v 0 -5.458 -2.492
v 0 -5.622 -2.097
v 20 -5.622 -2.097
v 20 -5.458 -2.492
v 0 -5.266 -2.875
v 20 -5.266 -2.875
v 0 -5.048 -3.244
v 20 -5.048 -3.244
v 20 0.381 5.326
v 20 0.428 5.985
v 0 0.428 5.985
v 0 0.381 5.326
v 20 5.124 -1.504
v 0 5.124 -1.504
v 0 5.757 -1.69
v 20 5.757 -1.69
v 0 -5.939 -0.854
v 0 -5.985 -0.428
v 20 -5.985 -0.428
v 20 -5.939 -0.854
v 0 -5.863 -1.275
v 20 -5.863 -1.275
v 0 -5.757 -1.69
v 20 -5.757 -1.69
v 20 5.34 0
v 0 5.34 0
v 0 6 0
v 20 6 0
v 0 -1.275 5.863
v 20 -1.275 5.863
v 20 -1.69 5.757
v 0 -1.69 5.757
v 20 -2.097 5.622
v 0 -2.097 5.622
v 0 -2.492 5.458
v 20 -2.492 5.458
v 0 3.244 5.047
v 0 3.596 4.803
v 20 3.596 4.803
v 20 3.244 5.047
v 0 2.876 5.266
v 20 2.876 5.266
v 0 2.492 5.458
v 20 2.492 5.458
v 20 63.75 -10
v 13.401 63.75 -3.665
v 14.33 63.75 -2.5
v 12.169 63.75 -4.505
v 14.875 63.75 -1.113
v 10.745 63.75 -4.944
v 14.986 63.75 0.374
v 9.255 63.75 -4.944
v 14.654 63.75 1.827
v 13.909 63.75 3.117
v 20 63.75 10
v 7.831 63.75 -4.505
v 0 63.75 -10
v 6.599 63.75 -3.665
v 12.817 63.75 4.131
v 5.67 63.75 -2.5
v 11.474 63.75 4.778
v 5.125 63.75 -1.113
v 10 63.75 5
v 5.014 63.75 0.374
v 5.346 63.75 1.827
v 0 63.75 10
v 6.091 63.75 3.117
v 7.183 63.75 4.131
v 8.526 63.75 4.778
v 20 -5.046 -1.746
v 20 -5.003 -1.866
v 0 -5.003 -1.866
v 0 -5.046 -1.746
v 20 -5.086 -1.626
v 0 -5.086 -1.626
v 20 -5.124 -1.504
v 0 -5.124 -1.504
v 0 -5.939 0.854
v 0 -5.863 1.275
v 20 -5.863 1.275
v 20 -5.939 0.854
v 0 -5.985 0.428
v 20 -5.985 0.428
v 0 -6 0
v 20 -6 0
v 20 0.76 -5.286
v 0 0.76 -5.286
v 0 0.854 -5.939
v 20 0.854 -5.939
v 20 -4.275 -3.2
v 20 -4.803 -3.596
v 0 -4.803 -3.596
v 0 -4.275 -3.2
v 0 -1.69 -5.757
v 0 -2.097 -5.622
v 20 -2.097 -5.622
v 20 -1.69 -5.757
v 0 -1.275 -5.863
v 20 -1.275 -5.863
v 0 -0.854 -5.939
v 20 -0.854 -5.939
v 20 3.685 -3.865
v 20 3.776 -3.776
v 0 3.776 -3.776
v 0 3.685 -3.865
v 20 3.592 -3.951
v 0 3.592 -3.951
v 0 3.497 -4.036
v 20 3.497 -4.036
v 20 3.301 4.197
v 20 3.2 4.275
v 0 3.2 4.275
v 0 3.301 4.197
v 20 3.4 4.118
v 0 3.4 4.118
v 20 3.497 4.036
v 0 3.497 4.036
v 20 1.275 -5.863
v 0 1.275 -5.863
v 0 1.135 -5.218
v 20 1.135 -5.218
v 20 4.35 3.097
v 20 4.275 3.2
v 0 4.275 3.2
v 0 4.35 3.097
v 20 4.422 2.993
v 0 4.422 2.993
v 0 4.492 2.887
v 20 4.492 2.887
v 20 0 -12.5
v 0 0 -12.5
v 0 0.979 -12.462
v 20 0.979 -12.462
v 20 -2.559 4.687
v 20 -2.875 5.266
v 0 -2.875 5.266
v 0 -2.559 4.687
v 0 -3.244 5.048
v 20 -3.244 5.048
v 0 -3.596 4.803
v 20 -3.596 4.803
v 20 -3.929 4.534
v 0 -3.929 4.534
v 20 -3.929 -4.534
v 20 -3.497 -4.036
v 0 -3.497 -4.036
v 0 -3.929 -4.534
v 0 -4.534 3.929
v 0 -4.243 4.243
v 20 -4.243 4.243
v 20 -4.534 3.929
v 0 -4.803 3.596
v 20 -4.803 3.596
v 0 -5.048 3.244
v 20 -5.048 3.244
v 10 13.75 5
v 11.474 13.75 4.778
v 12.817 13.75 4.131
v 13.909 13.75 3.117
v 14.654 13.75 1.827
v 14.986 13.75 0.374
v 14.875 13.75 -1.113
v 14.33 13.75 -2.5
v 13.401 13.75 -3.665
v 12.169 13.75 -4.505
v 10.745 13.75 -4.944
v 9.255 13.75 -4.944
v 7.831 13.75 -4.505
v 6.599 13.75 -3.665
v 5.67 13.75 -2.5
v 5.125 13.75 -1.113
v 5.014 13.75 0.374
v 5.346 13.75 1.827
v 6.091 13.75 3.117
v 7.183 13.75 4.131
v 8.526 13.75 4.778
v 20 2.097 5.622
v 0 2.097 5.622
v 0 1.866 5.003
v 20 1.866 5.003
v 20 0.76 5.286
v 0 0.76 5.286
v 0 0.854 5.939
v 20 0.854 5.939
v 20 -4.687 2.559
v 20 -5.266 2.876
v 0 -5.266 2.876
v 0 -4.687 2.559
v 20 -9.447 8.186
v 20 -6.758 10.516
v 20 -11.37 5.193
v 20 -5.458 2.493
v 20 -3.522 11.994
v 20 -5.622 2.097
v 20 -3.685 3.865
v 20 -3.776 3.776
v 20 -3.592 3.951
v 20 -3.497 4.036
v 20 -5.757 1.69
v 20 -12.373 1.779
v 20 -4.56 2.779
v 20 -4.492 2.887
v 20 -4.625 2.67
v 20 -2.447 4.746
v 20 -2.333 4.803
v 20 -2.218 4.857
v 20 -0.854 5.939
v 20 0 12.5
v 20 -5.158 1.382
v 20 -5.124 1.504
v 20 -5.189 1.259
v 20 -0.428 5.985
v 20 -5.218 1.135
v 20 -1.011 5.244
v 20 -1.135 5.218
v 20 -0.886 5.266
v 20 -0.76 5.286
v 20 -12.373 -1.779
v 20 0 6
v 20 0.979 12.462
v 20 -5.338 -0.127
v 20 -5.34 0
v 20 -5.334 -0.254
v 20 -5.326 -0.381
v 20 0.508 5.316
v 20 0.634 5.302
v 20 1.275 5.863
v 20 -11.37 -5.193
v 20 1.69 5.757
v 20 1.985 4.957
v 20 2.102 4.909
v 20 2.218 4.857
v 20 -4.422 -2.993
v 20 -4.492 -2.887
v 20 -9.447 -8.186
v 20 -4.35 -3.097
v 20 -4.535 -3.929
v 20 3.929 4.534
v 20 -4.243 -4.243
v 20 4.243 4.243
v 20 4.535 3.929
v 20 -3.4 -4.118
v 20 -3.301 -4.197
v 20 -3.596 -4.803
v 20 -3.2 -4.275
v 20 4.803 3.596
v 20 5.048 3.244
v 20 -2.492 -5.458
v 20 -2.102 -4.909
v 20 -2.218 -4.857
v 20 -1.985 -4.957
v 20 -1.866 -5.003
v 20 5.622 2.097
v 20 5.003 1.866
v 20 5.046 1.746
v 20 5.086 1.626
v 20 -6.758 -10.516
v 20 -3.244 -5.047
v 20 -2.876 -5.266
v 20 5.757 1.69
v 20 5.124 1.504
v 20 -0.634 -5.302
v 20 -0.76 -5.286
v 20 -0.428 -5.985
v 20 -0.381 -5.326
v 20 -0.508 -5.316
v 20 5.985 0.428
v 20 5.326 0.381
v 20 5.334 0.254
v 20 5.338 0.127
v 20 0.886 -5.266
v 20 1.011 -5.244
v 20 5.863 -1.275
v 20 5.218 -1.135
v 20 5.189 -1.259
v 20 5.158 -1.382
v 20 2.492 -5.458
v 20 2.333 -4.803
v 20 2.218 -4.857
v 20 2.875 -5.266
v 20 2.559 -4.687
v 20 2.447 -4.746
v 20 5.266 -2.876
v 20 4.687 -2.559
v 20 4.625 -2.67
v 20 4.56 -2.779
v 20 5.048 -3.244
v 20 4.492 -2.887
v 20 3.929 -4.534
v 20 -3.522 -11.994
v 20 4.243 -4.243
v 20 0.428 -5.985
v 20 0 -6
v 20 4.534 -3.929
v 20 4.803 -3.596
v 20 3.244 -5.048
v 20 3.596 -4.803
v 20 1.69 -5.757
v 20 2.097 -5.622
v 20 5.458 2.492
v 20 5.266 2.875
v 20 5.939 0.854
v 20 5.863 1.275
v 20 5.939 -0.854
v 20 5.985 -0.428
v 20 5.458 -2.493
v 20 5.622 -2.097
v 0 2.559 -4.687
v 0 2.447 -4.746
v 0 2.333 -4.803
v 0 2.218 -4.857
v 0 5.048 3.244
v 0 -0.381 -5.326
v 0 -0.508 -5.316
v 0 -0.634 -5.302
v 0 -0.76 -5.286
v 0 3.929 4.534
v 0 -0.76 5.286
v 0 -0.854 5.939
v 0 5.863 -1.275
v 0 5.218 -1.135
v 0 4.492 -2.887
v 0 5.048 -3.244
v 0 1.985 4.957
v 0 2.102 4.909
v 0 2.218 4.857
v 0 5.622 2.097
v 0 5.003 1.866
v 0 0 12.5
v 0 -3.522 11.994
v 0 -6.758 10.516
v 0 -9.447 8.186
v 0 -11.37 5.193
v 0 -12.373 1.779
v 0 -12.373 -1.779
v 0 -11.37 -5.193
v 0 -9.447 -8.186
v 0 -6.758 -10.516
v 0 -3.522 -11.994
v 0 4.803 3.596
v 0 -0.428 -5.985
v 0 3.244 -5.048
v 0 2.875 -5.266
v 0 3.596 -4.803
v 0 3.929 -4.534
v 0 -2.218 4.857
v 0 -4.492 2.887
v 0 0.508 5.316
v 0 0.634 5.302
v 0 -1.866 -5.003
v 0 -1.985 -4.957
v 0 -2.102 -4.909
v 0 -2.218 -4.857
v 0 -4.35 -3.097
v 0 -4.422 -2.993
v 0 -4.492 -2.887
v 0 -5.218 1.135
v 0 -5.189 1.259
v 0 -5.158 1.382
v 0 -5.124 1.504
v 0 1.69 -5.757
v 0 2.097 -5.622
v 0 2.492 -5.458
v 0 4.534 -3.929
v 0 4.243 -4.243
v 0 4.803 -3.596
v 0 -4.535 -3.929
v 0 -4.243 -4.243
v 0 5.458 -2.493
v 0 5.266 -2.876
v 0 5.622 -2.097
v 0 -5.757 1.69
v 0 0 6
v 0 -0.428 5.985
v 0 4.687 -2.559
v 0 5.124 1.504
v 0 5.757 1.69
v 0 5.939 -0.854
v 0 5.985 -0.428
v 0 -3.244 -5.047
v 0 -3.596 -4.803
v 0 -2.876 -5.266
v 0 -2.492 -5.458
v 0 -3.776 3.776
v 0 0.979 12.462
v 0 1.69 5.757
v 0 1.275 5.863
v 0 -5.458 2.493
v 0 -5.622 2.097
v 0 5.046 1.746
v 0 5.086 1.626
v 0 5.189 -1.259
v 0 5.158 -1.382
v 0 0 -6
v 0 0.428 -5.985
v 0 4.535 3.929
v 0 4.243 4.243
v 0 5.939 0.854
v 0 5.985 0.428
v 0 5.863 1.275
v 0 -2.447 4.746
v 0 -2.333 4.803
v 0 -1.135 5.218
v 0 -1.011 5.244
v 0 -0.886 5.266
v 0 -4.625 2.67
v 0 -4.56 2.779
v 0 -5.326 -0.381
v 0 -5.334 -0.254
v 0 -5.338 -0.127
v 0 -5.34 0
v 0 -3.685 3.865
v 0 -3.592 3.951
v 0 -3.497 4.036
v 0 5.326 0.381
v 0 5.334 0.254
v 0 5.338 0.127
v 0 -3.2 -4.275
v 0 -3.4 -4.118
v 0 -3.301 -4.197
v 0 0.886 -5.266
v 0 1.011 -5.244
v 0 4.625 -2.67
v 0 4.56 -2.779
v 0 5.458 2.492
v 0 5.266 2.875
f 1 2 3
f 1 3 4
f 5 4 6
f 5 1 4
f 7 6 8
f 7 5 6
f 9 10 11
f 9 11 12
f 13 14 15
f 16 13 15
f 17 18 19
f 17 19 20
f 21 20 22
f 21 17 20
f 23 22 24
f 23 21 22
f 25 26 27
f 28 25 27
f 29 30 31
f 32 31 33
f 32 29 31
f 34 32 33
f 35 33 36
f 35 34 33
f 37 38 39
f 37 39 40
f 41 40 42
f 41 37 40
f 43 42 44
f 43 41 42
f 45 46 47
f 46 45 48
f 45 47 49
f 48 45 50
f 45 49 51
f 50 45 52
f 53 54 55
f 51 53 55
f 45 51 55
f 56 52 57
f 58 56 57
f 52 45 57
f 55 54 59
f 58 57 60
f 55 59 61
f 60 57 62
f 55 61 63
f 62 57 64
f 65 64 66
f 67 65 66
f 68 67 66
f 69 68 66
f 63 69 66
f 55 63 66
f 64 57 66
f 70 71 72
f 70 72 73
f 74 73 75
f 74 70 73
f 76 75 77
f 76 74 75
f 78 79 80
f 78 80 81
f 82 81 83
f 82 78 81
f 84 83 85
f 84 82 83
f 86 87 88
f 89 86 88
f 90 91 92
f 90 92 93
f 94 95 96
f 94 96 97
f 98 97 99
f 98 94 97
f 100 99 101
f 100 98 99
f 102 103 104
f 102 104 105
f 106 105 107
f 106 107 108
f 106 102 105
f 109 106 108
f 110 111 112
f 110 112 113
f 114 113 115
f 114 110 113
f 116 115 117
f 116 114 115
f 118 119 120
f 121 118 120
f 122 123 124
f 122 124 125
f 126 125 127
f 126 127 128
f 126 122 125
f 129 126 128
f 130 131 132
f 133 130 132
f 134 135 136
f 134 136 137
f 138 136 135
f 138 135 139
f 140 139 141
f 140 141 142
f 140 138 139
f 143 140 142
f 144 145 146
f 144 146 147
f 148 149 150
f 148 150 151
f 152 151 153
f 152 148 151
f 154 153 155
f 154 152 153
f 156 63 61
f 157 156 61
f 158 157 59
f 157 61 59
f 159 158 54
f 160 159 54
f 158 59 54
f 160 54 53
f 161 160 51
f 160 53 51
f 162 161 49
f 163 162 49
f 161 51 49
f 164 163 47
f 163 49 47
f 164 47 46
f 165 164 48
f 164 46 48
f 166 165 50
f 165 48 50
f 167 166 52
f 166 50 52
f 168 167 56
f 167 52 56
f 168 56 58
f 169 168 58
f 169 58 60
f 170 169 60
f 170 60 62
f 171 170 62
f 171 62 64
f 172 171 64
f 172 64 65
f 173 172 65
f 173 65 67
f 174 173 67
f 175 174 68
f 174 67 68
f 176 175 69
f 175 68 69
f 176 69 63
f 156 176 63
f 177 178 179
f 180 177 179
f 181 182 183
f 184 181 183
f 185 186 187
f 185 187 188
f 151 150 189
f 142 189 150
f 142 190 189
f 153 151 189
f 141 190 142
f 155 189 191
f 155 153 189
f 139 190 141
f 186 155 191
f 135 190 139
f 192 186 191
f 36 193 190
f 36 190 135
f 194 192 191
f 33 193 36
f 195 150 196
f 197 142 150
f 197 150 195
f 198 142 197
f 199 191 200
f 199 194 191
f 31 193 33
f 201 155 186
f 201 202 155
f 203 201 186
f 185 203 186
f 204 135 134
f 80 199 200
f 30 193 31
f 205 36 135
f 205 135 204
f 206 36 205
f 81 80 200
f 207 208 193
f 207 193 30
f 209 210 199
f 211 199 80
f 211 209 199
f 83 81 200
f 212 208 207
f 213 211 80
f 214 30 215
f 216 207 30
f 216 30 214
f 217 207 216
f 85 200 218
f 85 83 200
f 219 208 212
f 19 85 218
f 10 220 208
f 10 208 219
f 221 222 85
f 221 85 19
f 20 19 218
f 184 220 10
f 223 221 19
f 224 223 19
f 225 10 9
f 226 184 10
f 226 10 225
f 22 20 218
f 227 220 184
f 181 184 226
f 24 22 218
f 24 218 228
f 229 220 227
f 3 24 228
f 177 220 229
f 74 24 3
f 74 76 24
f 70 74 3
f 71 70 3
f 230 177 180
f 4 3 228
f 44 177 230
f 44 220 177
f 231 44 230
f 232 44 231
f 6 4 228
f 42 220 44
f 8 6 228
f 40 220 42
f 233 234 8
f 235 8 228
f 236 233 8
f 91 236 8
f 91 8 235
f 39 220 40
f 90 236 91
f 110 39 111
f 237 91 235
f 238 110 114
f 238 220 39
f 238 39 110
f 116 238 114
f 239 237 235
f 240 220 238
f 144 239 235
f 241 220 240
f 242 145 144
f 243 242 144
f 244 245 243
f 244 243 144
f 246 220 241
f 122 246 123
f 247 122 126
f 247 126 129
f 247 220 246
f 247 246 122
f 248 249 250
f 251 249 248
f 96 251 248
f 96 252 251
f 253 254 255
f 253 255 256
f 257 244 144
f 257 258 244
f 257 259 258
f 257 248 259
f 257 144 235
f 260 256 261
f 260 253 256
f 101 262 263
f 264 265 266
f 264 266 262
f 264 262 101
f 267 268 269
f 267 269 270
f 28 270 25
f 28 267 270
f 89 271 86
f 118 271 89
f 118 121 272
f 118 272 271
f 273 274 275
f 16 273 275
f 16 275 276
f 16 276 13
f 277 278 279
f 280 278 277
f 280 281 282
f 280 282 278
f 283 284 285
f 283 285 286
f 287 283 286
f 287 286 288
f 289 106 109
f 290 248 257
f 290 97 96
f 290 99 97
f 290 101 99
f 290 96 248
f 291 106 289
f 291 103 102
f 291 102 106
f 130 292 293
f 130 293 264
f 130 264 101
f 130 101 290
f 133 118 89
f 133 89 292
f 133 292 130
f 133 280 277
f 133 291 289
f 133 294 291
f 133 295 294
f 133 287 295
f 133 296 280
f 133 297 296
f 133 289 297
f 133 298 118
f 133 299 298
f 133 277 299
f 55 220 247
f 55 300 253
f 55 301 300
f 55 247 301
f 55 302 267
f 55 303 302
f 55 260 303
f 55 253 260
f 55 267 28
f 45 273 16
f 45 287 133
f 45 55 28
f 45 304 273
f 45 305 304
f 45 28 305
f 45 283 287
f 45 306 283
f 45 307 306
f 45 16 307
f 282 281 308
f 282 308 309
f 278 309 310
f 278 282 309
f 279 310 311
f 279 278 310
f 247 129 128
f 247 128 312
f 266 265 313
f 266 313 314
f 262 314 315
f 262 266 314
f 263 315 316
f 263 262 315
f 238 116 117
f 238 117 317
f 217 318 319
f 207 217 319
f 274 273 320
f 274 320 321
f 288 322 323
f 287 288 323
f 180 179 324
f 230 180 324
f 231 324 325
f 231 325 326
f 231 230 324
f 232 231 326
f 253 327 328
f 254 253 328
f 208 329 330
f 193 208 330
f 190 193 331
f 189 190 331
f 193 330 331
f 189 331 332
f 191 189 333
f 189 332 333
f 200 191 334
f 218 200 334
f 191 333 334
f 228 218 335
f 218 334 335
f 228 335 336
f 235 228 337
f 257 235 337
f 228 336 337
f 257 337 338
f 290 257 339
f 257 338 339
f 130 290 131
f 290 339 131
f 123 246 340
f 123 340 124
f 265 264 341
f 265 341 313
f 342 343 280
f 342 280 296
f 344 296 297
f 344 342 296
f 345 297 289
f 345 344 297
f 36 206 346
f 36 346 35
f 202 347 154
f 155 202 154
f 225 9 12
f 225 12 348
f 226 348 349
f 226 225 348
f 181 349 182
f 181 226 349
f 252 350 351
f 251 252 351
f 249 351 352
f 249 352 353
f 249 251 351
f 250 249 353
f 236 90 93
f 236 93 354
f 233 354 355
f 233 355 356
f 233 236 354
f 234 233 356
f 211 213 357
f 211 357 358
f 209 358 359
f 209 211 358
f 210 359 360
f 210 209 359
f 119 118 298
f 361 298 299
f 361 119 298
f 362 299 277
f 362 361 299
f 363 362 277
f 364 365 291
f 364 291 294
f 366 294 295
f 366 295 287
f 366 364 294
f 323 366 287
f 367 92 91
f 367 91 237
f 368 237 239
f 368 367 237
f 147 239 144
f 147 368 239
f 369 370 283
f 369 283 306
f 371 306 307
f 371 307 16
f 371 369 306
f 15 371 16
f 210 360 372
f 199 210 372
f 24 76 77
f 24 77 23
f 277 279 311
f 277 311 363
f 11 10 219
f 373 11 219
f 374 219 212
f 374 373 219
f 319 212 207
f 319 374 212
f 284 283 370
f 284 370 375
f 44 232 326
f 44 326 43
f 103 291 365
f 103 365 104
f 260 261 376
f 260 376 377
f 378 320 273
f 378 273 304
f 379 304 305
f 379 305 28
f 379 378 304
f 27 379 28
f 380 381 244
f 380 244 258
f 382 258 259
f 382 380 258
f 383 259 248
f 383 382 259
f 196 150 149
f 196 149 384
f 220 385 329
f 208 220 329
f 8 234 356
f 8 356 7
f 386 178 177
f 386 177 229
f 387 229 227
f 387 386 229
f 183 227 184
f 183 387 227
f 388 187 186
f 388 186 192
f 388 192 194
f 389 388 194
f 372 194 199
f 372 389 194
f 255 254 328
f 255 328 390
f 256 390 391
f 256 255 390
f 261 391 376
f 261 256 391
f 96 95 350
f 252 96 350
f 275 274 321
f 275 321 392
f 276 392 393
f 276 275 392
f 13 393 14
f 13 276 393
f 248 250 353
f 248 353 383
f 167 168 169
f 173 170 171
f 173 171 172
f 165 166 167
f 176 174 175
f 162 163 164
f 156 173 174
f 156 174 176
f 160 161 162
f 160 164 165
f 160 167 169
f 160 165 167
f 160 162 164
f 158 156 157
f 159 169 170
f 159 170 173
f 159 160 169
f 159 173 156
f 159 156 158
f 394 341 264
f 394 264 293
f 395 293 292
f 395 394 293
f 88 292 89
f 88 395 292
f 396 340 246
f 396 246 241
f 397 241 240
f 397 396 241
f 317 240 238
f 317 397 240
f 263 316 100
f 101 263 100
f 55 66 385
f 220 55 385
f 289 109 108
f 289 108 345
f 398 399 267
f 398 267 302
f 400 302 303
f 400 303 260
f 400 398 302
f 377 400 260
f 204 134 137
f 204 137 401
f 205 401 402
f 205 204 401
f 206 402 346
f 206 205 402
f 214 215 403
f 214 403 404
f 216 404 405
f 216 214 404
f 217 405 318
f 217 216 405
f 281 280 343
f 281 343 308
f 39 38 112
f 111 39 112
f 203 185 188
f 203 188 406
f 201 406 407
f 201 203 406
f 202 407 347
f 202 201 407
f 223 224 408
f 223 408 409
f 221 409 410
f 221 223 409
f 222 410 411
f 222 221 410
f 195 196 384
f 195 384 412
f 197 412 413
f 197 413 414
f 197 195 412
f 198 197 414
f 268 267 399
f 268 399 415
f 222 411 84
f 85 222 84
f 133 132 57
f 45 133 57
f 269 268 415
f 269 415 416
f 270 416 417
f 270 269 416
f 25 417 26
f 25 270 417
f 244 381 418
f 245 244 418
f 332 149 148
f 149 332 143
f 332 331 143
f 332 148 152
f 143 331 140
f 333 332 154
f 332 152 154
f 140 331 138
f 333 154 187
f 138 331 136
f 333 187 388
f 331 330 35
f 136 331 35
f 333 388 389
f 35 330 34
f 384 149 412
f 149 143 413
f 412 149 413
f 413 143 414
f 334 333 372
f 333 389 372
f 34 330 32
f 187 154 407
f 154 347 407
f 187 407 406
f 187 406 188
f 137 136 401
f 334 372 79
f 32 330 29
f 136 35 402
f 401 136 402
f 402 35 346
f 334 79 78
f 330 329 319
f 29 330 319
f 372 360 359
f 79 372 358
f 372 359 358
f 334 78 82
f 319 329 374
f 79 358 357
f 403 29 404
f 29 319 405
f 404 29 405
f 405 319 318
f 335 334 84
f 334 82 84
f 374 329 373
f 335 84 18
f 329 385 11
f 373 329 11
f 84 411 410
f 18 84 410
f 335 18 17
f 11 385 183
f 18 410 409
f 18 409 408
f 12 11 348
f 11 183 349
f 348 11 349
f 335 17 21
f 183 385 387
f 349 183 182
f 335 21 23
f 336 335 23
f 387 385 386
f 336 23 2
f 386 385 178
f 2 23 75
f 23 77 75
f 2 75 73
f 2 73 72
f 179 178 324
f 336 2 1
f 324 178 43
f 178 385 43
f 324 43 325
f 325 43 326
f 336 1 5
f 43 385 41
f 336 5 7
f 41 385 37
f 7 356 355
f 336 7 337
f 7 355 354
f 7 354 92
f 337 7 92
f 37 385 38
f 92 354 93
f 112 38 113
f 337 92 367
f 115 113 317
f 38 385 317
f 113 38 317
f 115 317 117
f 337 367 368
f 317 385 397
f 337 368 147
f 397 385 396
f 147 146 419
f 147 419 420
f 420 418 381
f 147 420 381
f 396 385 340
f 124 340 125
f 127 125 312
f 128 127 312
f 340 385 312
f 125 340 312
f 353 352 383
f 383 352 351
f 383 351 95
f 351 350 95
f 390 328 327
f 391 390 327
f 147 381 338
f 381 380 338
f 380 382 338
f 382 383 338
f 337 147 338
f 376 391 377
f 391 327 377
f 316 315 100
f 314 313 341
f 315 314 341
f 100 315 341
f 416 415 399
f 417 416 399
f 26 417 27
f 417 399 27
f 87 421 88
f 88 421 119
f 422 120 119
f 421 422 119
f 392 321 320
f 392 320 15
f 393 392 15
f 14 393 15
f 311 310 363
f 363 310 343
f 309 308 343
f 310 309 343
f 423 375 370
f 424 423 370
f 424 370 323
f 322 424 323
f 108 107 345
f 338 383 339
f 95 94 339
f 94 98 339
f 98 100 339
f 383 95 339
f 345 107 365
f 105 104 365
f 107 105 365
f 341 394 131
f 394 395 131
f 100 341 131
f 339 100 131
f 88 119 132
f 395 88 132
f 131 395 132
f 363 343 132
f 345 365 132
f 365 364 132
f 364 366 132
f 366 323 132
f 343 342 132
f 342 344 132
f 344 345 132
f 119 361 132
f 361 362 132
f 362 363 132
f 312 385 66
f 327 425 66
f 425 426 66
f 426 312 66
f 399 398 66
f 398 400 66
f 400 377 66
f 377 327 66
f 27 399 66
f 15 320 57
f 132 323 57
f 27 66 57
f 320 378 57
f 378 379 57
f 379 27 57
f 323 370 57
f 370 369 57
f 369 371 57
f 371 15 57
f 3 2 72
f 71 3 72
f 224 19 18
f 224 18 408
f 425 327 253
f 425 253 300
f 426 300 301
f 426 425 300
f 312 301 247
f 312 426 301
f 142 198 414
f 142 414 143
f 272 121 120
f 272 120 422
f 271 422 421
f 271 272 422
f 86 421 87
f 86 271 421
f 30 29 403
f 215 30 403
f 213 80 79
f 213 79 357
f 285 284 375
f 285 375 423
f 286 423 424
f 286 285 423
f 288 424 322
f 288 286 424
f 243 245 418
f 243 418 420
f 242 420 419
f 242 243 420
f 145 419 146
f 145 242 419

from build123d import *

# Parameters (mm, degrees)
SKETCH1_R           = 6
BOSS_EXTRUDE1_DEPTH = 20
SKETCH2_R           = 5
CUT_EXTRUDE1_DEPTH  = 50
BOSS_EXTRUDE2_DEPTH = 20


with BuildPart() as part:
    # Sketch1 → Boss-Extrude1 (new body)
    with BuildSketch(Plane(origin=(0, 0, 0), x_dir=(0, 0, -1), z_dir=(1, 0, 0))):
        with BuildLine():
            Line((10, 63.75), (0, 63.75))
            Line((0, 63.75), (-10, 63.75))
            Line((-10, 63.75), (-12.461612284, 0.978886756))
            Line((-12.461612284, 0.978886756), (-12.5, 0))
            ThreePointArc((-12.5, 0), (0, -12.5), (12.5, 0))
            Line((12.5, 0), (12.461612284, 0.978886756))
            Line((12.461612284, 0.978886756), (10, 63.75))
        make_face()
        Circle(SKETCH1_R, mode=Mode.SUBTRACT)
    extrude(amount=BOSS_EXTRUDE1_DEPTH)

    # Sketch2 → Cut-Extrude1 (cut)
    with BuildSketch(Plane(origin=(0, 63.75, 0), x_dir=(1, 0, 0), z_dir=(0, 1, 0))):
        with Locations(Location((10, 0, 0), (0, 0, 270))):
            Circle(SKETCH2_R)
    extrude(amount=-CUT_EXTRUDE1_DEPTH, mode=Mode.SUBTRACT)

    # Sketch3 → Boss-Extrude2 (add)
    with BuildSketch(Plane(origin=(20, 0, 0), x_dir=(0, 0, -1), z_dir=(1, 0, 0))):
        with BuildLine():
            ThreePointArc((0, 6), (-0.214106434, 5.996178653), (-0.427940142, 5.984719478))
            Line((-0.427940142, 5.984719478), (-0.380866727, 5.326400336))
            ThreePointArc((-0.380866727, 5.326400336), (-0.190554726, 5.336599001), (0, 5.34))
            Line((0, 5.34), (0, 6))
        make_face()
        with BuildLine():
            Line((-1.504451854, 5.123692479), (-1.690395341, 5.756957842))
            ThreePointArc((-1.690395341, 5.756957842), (-1.894752362, 5.692970533), (-2.09669588, 5.621731618))
            Line((-2.09669588, 5.621731618), (-1.866059333, 5.00334114))
            ThreePointArc((-1.866059333, 5.00334114), (-1.686329602, 5.066743774), (-1.504451854, 5.123692479))
        make_face()
        with BuildLine():
            ThreePointArc((1.690395341, 5.756957842), (1.483885124, 5.813612039), (1.275484761, 5.862860959))
            Line((1.275484761, 5.862860959), (1.135181437, 5.217946254))
            ThreePointArc((1.135181437, 5.217946254), (1.320657761, 5.174114715), (1.504451853, 5.123692479))
            Line((1.504451853, 5.123692479), (1.690395341, 5.756957842))
        make_face()
        with BuildLine():
            Line((-2.887021965, 4.492293865), (-3.243844905, 5.047521197))
            ThreePointArc((-3.243844905, 5.047521197), (-3.421896722, 4.928551798), (-3.595589788, 4.803304496))
            Line((-3.595589788, 4.803304496), (-3.200074911, 4.274941001))
            ThreePointArc((-3.200074911, 4.274941001), (-3.045488083, 4.3864111), (-2.887021965, 4.492293865))
        make_face()
        with BuildLine():
            ThreePointArc((3.243844904, 5.047521197), (3.061661135, 5.160061152), (2.875577474, 5.266028313))
            Line((2.875577474, 5.266028313), (2.559263952, 4.686765198))
            ThreePointArc((2.559263952, 4.686765198), (2.72487841, 4.592454426), (2.887021965, 4.492293866))
            Line((2.887021965, 4.492293866), (3.243844904, 5.047521197))
        make_face()
        with BuildLine():
            Line((-4.035702727, 3.496956319), (-4.534497446, 3.929164403))
            ThreePointArc((-4.534497446, 3.929164403), (-4.671819361, 3.764851107), (-4.803190394, 3.59574221))
            Line((-4.803190394, 3.59574221), (-4.274839451, 3.200210567))
            ThreePointArc((-4.274839451, 3.200210567), (-4.157919231, 3.350717485), (-4.035702727, 3.496956319))
        make_face()
        with BuildLine():
            ThreePointArc((4.534497446, 3.929164404), (4.391399568, 4.0884728), (4.242708003, 4.24257337))
            Line((4.242708003, 4.24257337), (3.776010122, 3.7758903))
            ThreePointArc((3.776010122, 3.7758903), (3.908345616, 3.638740792), (4.035702727, 3.49695632))
            Line((4.035702727, 3.49695632), (4.534497446, 3.929164404))
        make_face()
        with BuildLine():
            Line((-4.857434855, 2.218316169), (-5.457791972, 2.492490078))
            ThreePointArc((-5.457791972, 2.492490078), (-5.543258979, 2.29614457), (-5.621665081, 2.096874274))
            Line((-5.621665081, 2.096874274), (-5.003281922, 1.866218104))
            ThreePointArc((-5.003281922, 1.866218104), (-4.933500492, 2.043568668), (-4.857434855, 2.218316169))
        make_face()
        with BuildLine():
            ThreePointArc((5.457791972, 2.492490078), (5.365372925, 2.685660696), (5.266119561, 2.875410365))
            Line((5.266119561, 2.875410365), (4.686846409, 2.559115225))
            ThreePointArc((4.686846409, 2.559115225), (4.775181904, 2.390238019), (4.857434855, 2.21831617))
            Line((4.857434855, 2.21831617), (5.457791972, 2.492490078))
        make_face()
        with BuildLine():
            Line((-5.2856465, 0.759961236), (-5.938928651, 0.853889029))
            ThreePointArc((-5.938928651, 0.853889029), (-5.965616722, 0.641418056), (-5.984705895, 0.428130056))
            Line((-5.984705895, 0.428130056), (-5.326388247, 0.38103575))
            ThreePointArc((-5.326388247, 0.38103575), (-5.309398883, 0.57086207), (-5.2856465, 0.759961236))
        make_face()
        with BuildLine():
            ThreePointArc((5.938928651, 0.85388903), (5.904675677, 1.065272334), (5.862901431, 1.275298713))
            Line((5.862901431, 1.275298713), (5.217982274, 1.135015855))
            ThreePointArc((5.217982274, 1.135015855), (5.255161353, 0.948092378), (5.2856465, 0.759961237))
            Line((5.2856465, 0.759961237), (5.938928651, 0.85388903))
        make_face()
        with BuildLine():
            Line((-5.2856465, -0.759961237), (-5.938928651, -0.85388903))
            ThreePointArc((-5.938928651, -0.85388903), (-5.904675677, -1.065272334), (-5.862901431, -1.275298713))
            Line((-5.862901431, -1.275298713), (-5.217982274, -1.135015855))
            ThreePointArc((-5.217982274, -1.135015855), (-5.255161353, -0.948092378), (-5.2856465, -0.759961237))
        make_face()
        with BuildLine():
            ThreePointArc((5.938928651, -0.853889029), (5.965616722, -0.641418056), (5.984705895, -0.428130056))
            Line((5.984705895, -0.428130056), (5.326388247, -0.38103575))
            ThreePointArc((5.326388247, -0.38103575), (5.309398883, -0.57086207), (5.2856465, -0.759961236))
            Line((5.2856465, -0.759961236), (5.938928651, -0.853889029))
        make_face()
        with BuildLine():
            Line((-4.857434855, -2.21831617), (-5.457791972, -2.492490078))
            ThreePointArc((-5.457791972, -2.492490078), (-5.365372925, -2.685660696), (-5.266119561, -2.875410365))
            Line((-5.266119561, -2.875410365), (-4.686846409, -2.559115225))
            ThreePointArc((-4.686846409, -2.559115225), (-4.775181904, -2.390238019), (-4.857434855, -2.21831617))
        make_face()
        with BuildLine():
            ThreePointArc((5.457791972, -2.492490078), (5.543258979, -2.29614457), (5.621665081, -2.096874274))
            Line((5.621665081, -2.096874274), (5.003281922, -1.866218104))
            ThreePointArc((5.003281922, -1.866218104), (4.933500492, -2.043568668), (4.857434855, -2.218316169))
            Line((4.857434855, -2.218316169), (5.457791972, -2.492490078))
        make_face()
        with BuildLine():
            Line((-4.035702727, -3.49695632), (-4.534497446, -3.929164404))
            ThreePointArc((-4.534497446, -3.929164404), (-4.391399568, -4.0884728), (-4.242708003, -4.24257337))
            Line((-4.242708003, -4.24257337), (-3.776010122, -3.7758903))
            ThreePointArc((-3.776010122, -3.7758903), (-3.908345616, -3.638740792), (-4.035702727, -3.49695632))
        make_face()
        with BuildLine():
            ThreePointArc((4.534497446, -3.929164403), (4.671819361, -3.764851107), (4.803190394, -3.59574221))
            Line((4.803190394, -3.59574221), (4.274839451, -3.200210567))
            ThreePointArc((4.274839451, -3.200210567), (4.157919231, -3.350717485), (4.035702727, -3.496956319))
            Line((4.035702727, -3.496956319), (4.534497446, -3.929164403))
        make_face()
        with BuildLine():
            Line((-2.887021965, -4.492293866), (-3.243844904, -5.047521197))
            ThreePointArc((-3.243844904, -5.047521197), (-3.061661135, -5.160061152), (-2.875577474, -5.266028313))
            Line((-2.875577474, -5.266028313), (-2.559263952, -4.686765198))
            ThreePointArc((-2.559263952, -4.686765198), (-2.72487841, -4.592454426), (-2.887021965, -4.492293866))
        make_face()
        with BuildLine():
            ThreePointArc((3.243844905, -5.047521197), (3.421896722, -4.928551798), (3.595589788, -4.803304496))
            Line((3.595589788, -4.803304496), (3.200074911, -4.274941001))
            ThreePointArc((3.200074911, -4.274941001), (3.045488083, -4.3864111), (2.887021965, -4.492293865))
            Line((2.887021965, -4.492293865), (3.243844905, -5.047521197))
        make_face()
        with BuildLine():
            Line((-1.504451853, -5.123692479), (-1.690395341, -5.756957842))
            ThreePointArc((-1.690395341, -5.756957842), (-1.483885124, -5.813612039), (-1.275484761, -5.862860959))
            Line((-1.275484761, -5.862860959), (-1.135181437, -5.217946254))
            ThreePointArc((-1.135181437, -5.217946254), (-1.320657761, -5.174114715), (-1.504451853, -5.123692479))
        make_face()
        with BuildLine():
            ThreePointArc((1.690395341, -5.756957842), (1.894752362, -5.692970533), (2.09669588, -5.621731618))
            Line((2.09669588, -5.621731618), (1.866059333, -5.00334114))
            ThreePointArc((1.866059333, -5.00334114), (1.686329602, -5.066743774), (1.504451854, -5.123692479))
            Line((1.504451854, -5.123692479), (1.690395341, -5.756957842))
        make_face()
        with BuildLine():
            Line((0, -5.34), (0, -6))
            ThreePointArc((0, -6), (0.214106434, -5.996178653), (0.427940142, -5.984719478))
            Line((0.427940142, -5.984719478), (0.380866727, -5.326400336))
            ThreePointArc((0.380866727, -5.326400336), (0.190554726, -5.336599001), (0, -5.34))
        make_face()
    extrude(amount=-BOSS_EXTRUDE2_DEPTH)


solid = part.part
